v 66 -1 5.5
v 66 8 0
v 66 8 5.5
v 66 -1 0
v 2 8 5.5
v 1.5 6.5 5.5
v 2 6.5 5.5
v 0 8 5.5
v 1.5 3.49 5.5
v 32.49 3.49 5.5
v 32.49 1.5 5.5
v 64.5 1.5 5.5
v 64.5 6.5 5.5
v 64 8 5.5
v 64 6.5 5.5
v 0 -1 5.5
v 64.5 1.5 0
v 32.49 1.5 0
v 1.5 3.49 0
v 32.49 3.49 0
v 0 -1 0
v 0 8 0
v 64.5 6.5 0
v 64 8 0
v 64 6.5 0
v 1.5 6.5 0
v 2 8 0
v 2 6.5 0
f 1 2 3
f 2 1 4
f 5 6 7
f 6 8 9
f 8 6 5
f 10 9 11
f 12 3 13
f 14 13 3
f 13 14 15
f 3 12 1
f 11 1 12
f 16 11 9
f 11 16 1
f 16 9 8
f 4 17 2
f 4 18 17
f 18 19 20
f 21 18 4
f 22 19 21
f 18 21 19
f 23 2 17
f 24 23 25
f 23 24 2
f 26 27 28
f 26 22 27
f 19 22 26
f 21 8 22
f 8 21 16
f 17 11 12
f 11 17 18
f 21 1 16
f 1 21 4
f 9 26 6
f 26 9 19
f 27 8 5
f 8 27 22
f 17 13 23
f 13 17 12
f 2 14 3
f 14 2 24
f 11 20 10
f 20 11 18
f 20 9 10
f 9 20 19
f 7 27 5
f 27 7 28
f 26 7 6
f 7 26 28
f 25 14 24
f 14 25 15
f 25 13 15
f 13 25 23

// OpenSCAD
//  Clip to hold the dead bug ESP32-S3 devkit board in place.
//  This bracket can then be glued to the base.

width = 5.5;
length = 63;
height = 5;
lip = 0.5;
lump = length - 32;
lump_t = 2;

thick = 1.5;
base = thick + 1;

lo = length + (2 * thick);
ho =  height + (2 * thick);

// base
translate([ 0, thick-base, 0 ] )
cube([ lo, base, width] );
// ends
cube([ thick, ho, width ] );
translate([ length + thick, 0, 0 ] )
cube([ thick, ho, width ] );
// lump
translate([ thick - 0.01, thick - 0.01, 0] )
cube([ lump, lump_t, width ] );
// tabs
translate([ 0, height + thick, 0 ] )
cube([ thick + lip, thick, width ] );
translate([ lo - lip - thick, height + thick, 0 ] )
cube([ thick + lip, thick, width ] );

//  FIN
